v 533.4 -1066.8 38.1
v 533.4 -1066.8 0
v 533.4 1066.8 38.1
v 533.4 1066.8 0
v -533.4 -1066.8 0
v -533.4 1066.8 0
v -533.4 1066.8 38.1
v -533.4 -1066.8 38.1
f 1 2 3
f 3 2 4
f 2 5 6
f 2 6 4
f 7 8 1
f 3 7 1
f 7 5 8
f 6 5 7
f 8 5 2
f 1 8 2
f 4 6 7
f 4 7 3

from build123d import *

# Parameters (mm, degrees)
F1_W     = 1066.8
F1_H     = 2133.6
F2_DEPTH = 38.1
F0_W     = 1066.8
F0_H     = 2133.6


with BuildPart() as f2:
    # F1 (on face) → F2 (new body)
    with BuildSketch(Plane.XY):
        Rectangle(F1_W, F1_H)
    extrude(amount=F2_DEPTH)


with BuildPart() as f2b:
    # F0 (on Top) → F2, piece 2 (new body)
    with BuildSketch(Plane.XY):
        Rectangle(F0_W, F0_H)
    extrude(amount=F2_DEPTH)


solid = f2.part
